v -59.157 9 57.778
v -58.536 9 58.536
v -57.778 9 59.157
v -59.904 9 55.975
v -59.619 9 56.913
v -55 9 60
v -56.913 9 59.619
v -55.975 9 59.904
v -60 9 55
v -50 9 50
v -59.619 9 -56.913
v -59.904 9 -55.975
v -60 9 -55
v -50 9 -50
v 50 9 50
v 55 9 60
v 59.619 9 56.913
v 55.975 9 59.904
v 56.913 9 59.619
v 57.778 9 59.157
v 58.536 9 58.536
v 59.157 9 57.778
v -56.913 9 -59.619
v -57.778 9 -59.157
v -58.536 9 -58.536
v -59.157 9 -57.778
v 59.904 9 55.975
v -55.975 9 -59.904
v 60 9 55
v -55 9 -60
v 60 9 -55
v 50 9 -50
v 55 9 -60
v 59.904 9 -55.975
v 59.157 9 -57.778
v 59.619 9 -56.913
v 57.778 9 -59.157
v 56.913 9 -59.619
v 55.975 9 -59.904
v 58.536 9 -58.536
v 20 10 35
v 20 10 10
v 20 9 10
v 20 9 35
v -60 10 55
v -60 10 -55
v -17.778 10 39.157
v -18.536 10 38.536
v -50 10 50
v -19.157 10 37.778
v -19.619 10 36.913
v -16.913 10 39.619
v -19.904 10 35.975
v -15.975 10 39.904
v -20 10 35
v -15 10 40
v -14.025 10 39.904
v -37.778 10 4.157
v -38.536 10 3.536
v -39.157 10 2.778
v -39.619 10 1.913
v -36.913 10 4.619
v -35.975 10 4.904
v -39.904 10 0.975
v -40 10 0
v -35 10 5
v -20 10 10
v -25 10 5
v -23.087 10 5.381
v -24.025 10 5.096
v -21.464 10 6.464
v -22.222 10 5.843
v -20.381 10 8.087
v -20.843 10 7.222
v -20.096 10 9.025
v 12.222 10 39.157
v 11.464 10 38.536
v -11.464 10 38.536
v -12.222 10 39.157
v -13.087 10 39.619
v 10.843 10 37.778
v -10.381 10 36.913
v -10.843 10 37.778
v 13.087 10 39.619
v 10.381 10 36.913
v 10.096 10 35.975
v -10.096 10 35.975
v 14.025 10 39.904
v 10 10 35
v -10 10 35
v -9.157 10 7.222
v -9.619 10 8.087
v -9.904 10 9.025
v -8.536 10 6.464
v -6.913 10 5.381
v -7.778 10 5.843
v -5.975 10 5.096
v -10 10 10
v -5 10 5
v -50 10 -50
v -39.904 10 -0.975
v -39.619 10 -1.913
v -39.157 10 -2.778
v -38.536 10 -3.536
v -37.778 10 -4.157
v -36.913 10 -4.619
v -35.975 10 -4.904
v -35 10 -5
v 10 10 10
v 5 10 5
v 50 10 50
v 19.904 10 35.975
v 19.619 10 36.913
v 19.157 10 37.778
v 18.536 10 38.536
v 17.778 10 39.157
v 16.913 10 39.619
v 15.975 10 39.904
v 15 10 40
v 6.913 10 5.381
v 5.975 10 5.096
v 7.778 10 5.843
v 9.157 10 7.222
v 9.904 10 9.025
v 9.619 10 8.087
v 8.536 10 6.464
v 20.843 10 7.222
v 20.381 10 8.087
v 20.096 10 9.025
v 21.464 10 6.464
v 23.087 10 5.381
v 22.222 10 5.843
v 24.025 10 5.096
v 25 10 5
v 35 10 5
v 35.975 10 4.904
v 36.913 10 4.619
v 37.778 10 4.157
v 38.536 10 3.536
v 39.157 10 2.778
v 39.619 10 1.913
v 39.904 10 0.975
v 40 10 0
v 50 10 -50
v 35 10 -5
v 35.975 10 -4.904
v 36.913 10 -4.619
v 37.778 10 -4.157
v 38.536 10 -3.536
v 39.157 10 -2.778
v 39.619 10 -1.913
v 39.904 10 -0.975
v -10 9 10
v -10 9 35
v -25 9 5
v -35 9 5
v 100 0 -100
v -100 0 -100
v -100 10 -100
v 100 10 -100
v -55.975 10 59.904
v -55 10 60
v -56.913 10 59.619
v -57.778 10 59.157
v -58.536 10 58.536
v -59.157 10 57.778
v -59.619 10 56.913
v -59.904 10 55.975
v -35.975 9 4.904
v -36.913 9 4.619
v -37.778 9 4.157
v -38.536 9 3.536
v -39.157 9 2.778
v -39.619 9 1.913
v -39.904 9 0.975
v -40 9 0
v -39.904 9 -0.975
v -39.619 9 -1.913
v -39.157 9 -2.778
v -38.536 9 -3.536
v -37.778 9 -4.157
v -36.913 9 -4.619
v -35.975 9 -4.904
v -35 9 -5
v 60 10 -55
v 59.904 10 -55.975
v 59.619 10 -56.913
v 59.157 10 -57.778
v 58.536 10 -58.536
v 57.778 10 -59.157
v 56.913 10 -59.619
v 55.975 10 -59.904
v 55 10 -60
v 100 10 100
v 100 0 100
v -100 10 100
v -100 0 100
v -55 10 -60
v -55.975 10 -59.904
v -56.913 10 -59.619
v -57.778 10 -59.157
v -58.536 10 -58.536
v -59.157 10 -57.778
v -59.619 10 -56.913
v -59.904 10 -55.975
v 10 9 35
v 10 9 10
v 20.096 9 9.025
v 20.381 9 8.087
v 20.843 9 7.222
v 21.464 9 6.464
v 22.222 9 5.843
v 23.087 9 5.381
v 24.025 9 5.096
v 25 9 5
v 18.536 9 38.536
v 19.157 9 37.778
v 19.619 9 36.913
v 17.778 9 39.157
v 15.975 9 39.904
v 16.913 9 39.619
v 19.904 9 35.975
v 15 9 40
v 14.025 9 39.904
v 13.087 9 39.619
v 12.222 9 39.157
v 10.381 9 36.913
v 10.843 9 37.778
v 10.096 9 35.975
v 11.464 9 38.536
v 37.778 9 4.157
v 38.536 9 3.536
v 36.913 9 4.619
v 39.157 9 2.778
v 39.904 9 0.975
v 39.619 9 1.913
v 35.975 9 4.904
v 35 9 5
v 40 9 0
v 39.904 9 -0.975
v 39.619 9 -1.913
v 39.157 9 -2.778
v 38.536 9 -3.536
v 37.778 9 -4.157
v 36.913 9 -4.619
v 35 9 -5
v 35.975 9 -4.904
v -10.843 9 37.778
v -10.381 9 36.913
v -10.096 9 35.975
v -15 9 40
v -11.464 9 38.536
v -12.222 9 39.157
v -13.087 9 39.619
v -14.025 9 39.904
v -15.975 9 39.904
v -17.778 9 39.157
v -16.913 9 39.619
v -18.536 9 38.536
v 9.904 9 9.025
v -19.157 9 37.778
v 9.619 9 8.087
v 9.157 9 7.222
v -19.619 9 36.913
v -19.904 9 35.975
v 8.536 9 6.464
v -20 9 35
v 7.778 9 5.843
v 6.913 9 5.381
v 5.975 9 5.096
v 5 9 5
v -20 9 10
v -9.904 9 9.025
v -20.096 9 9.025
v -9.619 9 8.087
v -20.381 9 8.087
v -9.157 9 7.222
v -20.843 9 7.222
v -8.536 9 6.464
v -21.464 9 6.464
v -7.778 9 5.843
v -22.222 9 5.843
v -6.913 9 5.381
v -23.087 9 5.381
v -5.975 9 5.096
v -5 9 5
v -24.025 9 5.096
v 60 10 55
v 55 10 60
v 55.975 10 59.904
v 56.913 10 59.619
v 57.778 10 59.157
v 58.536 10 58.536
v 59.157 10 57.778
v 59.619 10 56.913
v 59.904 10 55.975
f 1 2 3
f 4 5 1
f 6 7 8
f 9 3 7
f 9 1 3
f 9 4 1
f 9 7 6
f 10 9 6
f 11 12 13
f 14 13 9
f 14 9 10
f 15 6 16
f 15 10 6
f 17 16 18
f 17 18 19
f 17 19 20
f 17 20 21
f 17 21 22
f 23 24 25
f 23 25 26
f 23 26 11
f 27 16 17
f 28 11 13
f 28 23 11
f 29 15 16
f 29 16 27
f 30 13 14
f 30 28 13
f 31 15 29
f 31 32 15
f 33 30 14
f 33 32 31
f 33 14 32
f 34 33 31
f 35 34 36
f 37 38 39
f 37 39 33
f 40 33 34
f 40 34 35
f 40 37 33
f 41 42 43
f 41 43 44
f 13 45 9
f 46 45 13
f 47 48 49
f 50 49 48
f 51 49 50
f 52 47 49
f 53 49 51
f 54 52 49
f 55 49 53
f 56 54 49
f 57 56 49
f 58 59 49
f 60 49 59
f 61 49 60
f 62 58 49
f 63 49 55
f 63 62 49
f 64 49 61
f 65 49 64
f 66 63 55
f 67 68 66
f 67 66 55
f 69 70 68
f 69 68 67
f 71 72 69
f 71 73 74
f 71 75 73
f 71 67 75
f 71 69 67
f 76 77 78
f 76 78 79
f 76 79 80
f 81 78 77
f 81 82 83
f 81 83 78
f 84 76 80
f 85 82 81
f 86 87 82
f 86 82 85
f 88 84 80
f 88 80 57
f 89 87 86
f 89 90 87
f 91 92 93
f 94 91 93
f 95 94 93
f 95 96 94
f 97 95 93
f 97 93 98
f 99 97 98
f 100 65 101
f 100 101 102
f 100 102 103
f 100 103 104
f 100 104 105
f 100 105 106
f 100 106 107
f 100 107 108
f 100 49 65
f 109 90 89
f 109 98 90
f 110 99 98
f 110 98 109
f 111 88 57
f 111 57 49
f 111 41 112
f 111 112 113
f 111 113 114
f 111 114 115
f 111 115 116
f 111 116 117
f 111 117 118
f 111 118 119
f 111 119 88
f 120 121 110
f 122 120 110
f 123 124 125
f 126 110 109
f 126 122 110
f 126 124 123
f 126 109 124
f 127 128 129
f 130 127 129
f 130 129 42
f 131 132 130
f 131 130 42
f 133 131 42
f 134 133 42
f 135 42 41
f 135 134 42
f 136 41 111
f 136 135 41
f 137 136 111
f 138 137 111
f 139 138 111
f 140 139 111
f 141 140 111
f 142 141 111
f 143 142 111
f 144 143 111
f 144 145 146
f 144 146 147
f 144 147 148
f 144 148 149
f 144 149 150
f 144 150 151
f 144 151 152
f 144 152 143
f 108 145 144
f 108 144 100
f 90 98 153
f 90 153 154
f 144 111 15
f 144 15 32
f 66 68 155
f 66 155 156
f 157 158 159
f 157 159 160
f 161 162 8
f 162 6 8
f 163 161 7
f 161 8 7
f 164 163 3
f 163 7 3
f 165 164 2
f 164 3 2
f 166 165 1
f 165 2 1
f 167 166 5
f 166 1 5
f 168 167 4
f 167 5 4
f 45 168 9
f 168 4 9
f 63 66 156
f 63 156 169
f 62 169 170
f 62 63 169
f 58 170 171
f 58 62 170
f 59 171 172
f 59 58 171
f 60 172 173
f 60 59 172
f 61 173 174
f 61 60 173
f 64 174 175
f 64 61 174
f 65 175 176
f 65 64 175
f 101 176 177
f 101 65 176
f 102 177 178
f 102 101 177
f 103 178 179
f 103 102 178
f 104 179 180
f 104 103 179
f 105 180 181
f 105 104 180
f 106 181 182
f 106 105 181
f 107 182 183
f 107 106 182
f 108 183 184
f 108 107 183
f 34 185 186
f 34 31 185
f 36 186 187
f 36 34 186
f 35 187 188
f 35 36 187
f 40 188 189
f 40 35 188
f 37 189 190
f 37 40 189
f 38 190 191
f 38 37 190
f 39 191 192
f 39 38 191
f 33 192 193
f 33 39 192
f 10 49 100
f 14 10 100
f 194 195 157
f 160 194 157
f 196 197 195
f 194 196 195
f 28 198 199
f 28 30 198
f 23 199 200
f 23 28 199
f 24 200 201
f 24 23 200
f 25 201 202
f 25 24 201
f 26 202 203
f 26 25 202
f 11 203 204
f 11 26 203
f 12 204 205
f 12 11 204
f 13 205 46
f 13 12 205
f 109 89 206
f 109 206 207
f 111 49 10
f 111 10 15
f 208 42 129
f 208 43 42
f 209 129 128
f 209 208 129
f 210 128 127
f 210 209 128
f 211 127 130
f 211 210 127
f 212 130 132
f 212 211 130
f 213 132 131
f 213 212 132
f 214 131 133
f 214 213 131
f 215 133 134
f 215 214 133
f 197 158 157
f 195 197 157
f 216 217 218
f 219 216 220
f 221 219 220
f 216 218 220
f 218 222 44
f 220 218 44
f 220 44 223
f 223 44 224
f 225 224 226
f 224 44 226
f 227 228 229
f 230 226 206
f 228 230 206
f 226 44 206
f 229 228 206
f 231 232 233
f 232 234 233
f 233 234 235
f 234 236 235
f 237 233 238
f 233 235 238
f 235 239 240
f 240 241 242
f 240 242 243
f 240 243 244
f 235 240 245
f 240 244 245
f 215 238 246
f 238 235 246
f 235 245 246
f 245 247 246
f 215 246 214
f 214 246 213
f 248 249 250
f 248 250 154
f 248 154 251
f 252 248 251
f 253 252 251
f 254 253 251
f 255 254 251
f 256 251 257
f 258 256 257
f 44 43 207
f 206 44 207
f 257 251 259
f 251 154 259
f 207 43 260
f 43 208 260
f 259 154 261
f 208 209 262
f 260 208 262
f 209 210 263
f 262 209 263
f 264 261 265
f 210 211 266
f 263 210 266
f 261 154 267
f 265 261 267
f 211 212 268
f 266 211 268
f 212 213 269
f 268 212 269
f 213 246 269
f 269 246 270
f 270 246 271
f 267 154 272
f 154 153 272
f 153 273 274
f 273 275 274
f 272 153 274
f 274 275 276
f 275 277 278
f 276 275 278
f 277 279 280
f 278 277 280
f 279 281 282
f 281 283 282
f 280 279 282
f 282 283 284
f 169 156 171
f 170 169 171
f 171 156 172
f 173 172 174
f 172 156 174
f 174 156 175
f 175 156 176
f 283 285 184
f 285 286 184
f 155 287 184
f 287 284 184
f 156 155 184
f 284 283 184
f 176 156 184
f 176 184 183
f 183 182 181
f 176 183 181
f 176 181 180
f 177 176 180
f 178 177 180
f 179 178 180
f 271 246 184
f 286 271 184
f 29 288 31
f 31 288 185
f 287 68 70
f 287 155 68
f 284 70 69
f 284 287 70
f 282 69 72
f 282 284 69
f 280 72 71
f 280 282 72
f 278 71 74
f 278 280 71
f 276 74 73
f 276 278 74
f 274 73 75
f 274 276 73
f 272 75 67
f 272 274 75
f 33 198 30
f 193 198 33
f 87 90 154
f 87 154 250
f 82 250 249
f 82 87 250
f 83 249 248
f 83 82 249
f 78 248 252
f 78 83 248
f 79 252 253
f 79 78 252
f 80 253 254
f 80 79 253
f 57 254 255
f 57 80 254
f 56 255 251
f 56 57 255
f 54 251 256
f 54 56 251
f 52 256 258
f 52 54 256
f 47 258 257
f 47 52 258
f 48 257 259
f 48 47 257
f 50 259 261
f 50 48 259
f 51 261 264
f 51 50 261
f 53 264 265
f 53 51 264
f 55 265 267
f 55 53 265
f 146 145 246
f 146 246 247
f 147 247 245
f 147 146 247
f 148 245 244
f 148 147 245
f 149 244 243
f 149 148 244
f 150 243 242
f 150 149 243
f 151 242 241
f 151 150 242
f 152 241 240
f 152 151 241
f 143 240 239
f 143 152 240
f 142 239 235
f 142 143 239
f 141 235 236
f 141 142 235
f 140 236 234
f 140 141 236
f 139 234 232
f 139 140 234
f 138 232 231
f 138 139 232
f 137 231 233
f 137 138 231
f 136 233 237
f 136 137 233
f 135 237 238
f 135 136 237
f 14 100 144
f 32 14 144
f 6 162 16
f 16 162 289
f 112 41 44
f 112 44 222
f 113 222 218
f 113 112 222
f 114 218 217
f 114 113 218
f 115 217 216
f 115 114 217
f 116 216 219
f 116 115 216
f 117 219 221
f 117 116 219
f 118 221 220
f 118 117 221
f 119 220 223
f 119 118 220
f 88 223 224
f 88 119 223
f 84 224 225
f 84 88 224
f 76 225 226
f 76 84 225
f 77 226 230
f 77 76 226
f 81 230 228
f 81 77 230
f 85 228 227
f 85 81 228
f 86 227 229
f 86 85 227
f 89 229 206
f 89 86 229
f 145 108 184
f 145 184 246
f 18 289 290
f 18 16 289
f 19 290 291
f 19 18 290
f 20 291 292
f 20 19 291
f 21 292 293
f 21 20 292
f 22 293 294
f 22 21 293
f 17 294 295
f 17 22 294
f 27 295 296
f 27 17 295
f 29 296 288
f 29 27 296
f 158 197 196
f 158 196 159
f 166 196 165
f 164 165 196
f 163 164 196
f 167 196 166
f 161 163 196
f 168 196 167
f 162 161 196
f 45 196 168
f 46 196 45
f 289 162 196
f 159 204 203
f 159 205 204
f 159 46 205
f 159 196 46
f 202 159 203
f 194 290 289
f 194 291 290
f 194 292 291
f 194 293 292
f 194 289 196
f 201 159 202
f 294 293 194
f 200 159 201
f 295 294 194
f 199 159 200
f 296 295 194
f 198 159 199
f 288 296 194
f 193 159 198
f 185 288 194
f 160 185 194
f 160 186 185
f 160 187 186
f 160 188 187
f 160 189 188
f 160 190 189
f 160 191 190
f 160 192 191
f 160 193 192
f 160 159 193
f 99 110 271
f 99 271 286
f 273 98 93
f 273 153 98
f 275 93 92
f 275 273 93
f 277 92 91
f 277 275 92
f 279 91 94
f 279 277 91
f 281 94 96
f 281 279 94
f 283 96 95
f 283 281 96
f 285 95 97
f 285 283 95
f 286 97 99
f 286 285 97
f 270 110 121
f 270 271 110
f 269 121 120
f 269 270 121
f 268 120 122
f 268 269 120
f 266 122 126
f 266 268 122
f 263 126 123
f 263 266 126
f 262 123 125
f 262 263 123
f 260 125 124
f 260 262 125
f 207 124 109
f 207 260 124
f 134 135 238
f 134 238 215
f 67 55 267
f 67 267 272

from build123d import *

# Parameters (mm, degrees)
SKETCH1_W           = 200
SKETCH1_H           = 200
BOSS_EXTRUDE1_DEPTH = 10
SKETCH2_W           = 120
SKETCH2_H           = 120
SKETCH2_W_2         = 100
SKETCH2_H_2         = 100
CUT_EXTRUDE1_DEPTH  = 1
FILLET1_R           = 5


with BuildPart() as part:
    # Sketch1 → Boss-Extrude1 (new body)
    with BuildSketch(Plane(origin=(0, 0, 0), x_dir=(1, 0, 0), z_dir=(0, 1, 0))):
        Rectangle(SKETCH1_W, SKETCH1_H)
    extrude(amount=BOSS_EXTRUDE1_DEPTH)

    # Sketch2 → Cut-Extrude1 (cut)
    with BuildSketch(Plane(origin=(0, 10, 0), x_dir=(1, 0, 0), z_dir=(0, 1, 0))):
        Rectangle(SKETCH2_W, SKETCH2_H)
        Rectangle(SKETCH2_W_2, SKETCH2_H_2, mode=Mode.SUBTRACT)
        with BuildLine():
            Line((-35, 5), (35, 5))
            ThreePointArc((35, 5), (40, 0), (35, -5))
            Line((35, -5), (20, -5))
            Line((20, -5), (20, -35))
            ThreePointArc((20, -35), (15, -40), (10, -35))
            Line((10, -35), (10, -5))
            Line((10, -5), (-10, -5))
            Line((-10, -5), (-10, -35))
            ThreePointArc((-10, -35), (-15, -40), (-20, -35))
            Line((-20, -35), (-20, -5))
            Line((-20, -5), (-35, -5))
            ThreePointArc((-35, -5), (-40, 0), (-35, 5))
        make_face()
    extrude(amount=-CUT_EXTRUDE1_DEPTH, mode=Mode.SUBTRACT)

    # Fillet1
    fillet1_edges = [part.edges().sort_by_distance(p)[0] for p in [
        (20, 9.5, 5),
        (10, 9.5, 5),
        (-10, 9.5, 5),
        (-20, 9.5, 5),
        (-60, 9.5, 60),
        (-60, 9.5, -60),
        (60, 9.5, -60),
        (60, 9.5, 60),
    ]]
    fillet(fillet1_edges, radius=FILLET1_R)


solid = part.part
